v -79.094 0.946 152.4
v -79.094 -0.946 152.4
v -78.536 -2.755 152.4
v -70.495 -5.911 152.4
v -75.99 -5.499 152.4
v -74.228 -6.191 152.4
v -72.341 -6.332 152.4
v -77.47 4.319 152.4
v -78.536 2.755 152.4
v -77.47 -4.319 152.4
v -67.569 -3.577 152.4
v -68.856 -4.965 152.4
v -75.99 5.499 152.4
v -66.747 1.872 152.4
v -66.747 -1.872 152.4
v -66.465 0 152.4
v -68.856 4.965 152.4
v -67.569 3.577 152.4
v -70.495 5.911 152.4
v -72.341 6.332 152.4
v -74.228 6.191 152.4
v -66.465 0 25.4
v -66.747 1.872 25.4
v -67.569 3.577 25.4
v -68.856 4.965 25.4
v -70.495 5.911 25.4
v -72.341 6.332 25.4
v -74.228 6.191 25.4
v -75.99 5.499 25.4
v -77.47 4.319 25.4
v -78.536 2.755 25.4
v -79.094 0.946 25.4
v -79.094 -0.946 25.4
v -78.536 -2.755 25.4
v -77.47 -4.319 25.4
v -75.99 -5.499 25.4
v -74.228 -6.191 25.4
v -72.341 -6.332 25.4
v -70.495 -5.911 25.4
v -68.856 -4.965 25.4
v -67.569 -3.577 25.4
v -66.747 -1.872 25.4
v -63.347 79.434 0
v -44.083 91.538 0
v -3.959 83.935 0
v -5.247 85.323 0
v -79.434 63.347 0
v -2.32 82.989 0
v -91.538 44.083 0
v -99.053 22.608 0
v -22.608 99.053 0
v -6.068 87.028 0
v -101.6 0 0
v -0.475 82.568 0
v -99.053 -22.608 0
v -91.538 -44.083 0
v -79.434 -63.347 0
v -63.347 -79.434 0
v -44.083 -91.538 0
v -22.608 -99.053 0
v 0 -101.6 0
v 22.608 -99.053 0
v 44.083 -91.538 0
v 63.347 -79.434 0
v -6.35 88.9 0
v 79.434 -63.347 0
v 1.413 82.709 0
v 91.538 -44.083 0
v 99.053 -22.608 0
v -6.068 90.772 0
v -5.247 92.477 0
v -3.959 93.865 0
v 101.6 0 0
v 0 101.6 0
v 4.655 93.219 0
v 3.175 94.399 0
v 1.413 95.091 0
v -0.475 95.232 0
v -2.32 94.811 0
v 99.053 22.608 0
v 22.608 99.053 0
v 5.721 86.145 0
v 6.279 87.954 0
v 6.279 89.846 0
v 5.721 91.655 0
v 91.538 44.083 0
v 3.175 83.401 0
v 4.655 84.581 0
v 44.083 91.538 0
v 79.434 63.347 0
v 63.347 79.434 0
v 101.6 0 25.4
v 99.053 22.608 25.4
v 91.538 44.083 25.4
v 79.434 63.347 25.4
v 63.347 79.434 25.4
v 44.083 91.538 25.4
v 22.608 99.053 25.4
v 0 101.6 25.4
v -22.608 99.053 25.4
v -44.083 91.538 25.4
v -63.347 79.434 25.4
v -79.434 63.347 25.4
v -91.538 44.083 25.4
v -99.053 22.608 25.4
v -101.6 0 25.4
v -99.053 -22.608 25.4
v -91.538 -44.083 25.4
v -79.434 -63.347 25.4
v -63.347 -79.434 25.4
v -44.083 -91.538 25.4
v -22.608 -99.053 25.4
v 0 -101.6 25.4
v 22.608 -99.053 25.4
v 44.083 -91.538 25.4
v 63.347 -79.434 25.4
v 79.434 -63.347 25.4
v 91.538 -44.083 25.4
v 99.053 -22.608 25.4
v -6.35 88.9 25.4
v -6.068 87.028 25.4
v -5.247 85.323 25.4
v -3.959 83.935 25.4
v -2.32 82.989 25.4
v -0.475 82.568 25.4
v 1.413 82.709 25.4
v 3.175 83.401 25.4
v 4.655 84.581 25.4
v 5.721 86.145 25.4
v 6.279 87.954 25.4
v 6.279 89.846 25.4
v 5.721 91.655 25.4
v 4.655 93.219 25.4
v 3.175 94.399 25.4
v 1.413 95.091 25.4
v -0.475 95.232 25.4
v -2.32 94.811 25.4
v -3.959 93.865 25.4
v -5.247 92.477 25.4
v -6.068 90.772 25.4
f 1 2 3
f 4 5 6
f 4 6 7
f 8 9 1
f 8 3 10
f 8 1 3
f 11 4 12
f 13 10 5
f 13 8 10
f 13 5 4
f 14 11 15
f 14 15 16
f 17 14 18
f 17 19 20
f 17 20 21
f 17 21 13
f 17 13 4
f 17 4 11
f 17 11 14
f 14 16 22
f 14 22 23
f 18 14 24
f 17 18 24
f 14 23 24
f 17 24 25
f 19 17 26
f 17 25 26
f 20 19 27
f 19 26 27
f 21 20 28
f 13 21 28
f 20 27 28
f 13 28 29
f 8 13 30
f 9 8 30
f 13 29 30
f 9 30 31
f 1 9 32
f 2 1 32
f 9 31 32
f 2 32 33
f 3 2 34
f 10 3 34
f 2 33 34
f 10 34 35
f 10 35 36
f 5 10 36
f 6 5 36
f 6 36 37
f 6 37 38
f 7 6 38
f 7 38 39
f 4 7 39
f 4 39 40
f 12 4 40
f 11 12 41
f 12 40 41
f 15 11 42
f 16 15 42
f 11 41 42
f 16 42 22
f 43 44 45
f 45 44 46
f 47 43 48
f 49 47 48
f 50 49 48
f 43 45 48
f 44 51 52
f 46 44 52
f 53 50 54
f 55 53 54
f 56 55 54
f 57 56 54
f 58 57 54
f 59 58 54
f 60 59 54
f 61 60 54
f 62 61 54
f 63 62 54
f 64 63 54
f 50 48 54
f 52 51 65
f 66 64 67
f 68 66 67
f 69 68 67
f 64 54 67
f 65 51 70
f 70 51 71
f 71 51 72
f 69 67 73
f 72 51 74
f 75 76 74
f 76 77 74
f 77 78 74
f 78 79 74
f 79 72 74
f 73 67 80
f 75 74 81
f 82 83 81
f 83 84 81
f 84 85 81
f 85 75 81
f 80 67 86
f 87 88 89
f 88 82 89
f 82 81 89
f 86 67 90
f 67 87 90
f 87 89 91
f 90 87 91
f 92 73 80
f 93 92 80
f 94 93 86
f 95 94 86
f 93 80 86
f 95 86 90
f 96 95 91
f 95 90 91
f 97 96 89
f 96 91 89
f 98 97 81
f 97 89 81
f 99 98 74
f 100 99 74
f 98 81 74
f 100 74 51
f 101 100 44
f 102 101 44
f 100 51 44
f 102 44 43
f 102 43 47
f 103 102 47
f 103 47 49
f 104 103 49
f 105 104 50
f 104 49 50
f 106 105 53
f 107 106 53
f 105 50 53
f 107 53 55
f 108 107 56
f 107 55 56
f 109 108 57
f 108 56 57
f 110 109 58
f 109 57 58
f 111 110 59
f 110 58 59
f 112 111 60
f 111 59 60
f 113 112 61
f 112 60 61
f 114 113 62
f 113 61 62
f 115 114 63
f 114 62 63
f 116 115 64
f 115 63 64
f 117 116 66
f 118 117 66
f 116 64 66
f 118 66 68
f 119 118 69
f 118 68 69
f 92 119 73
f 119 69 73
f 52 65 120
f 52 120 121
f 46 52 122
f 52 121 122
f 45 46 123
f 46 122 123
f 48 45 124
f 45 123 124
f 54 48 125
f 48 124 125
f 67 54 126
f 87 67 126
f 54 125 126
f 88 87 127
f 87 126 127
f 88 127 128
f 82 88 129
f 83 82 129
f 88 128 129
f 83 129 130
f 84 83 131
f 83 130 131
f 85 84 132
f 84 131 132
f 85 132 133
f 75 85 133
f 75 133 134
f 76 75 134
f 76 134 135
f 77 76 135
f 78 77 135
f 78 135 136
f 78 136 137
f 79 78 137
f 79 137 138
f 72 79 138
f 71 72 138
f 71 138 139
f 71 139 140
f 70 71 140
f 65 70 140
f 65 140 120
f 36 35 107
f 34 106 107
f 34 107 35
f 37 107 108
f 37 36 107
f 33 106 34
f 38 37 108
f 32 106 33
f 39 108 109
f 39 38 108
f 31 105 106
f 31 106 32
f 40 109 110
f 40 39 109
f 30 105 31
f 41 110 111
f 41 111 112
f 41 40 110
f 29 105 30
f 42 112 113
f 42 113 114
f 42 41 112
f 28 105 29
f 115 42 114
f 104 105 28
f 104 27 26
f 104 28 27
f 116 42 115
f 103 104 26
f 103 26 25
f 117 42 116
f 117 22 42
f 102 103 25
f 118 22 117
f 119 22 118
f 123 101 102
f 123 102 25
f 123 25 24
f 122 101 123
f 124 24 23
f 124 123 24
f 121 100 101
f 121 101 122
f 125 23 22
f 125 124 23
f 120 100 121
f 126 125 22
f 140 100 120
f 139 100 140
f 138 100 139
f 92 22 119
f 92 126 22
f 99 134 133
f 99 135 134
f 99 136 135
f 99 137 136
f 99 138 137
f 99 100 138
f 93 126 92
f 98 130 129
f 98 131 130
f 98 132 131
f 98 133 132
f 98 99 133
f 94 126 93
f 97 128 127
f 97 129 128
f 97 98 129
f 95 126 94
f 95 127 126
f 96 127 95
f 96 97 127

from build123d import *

# Parameters (mm, degrees)
F0_R     = 101.6
F1_DEPTH = 25.4
F3_D     = 12.7
F4_R     = 6.35
F5_DEPTH = 127


with BuildPart() as f1:
    # F0 (on Top) → F1 (new body)
    with BuildSketch(Plane.XY):
        Circle(F0_R)
    extrude(amount=F1_DEPTH)

    # F3 (through all)
    with Locations(Plane(origin=(0, 0, 0), x_dir=(1, 0, 0), z_dir=(0, 0, -1))):
        with Locations((0, -88.9)):
            Hole(F3_D / 2)

    # F4 (on face) → F5 (join)
    with BuildSketch(Plane.XY.offset(25.4)):
        with Locations((-72.815311, 0)):
            Circle(F4_R)
    extrude(amount=F5_DEPTH)


solid = f1.part
